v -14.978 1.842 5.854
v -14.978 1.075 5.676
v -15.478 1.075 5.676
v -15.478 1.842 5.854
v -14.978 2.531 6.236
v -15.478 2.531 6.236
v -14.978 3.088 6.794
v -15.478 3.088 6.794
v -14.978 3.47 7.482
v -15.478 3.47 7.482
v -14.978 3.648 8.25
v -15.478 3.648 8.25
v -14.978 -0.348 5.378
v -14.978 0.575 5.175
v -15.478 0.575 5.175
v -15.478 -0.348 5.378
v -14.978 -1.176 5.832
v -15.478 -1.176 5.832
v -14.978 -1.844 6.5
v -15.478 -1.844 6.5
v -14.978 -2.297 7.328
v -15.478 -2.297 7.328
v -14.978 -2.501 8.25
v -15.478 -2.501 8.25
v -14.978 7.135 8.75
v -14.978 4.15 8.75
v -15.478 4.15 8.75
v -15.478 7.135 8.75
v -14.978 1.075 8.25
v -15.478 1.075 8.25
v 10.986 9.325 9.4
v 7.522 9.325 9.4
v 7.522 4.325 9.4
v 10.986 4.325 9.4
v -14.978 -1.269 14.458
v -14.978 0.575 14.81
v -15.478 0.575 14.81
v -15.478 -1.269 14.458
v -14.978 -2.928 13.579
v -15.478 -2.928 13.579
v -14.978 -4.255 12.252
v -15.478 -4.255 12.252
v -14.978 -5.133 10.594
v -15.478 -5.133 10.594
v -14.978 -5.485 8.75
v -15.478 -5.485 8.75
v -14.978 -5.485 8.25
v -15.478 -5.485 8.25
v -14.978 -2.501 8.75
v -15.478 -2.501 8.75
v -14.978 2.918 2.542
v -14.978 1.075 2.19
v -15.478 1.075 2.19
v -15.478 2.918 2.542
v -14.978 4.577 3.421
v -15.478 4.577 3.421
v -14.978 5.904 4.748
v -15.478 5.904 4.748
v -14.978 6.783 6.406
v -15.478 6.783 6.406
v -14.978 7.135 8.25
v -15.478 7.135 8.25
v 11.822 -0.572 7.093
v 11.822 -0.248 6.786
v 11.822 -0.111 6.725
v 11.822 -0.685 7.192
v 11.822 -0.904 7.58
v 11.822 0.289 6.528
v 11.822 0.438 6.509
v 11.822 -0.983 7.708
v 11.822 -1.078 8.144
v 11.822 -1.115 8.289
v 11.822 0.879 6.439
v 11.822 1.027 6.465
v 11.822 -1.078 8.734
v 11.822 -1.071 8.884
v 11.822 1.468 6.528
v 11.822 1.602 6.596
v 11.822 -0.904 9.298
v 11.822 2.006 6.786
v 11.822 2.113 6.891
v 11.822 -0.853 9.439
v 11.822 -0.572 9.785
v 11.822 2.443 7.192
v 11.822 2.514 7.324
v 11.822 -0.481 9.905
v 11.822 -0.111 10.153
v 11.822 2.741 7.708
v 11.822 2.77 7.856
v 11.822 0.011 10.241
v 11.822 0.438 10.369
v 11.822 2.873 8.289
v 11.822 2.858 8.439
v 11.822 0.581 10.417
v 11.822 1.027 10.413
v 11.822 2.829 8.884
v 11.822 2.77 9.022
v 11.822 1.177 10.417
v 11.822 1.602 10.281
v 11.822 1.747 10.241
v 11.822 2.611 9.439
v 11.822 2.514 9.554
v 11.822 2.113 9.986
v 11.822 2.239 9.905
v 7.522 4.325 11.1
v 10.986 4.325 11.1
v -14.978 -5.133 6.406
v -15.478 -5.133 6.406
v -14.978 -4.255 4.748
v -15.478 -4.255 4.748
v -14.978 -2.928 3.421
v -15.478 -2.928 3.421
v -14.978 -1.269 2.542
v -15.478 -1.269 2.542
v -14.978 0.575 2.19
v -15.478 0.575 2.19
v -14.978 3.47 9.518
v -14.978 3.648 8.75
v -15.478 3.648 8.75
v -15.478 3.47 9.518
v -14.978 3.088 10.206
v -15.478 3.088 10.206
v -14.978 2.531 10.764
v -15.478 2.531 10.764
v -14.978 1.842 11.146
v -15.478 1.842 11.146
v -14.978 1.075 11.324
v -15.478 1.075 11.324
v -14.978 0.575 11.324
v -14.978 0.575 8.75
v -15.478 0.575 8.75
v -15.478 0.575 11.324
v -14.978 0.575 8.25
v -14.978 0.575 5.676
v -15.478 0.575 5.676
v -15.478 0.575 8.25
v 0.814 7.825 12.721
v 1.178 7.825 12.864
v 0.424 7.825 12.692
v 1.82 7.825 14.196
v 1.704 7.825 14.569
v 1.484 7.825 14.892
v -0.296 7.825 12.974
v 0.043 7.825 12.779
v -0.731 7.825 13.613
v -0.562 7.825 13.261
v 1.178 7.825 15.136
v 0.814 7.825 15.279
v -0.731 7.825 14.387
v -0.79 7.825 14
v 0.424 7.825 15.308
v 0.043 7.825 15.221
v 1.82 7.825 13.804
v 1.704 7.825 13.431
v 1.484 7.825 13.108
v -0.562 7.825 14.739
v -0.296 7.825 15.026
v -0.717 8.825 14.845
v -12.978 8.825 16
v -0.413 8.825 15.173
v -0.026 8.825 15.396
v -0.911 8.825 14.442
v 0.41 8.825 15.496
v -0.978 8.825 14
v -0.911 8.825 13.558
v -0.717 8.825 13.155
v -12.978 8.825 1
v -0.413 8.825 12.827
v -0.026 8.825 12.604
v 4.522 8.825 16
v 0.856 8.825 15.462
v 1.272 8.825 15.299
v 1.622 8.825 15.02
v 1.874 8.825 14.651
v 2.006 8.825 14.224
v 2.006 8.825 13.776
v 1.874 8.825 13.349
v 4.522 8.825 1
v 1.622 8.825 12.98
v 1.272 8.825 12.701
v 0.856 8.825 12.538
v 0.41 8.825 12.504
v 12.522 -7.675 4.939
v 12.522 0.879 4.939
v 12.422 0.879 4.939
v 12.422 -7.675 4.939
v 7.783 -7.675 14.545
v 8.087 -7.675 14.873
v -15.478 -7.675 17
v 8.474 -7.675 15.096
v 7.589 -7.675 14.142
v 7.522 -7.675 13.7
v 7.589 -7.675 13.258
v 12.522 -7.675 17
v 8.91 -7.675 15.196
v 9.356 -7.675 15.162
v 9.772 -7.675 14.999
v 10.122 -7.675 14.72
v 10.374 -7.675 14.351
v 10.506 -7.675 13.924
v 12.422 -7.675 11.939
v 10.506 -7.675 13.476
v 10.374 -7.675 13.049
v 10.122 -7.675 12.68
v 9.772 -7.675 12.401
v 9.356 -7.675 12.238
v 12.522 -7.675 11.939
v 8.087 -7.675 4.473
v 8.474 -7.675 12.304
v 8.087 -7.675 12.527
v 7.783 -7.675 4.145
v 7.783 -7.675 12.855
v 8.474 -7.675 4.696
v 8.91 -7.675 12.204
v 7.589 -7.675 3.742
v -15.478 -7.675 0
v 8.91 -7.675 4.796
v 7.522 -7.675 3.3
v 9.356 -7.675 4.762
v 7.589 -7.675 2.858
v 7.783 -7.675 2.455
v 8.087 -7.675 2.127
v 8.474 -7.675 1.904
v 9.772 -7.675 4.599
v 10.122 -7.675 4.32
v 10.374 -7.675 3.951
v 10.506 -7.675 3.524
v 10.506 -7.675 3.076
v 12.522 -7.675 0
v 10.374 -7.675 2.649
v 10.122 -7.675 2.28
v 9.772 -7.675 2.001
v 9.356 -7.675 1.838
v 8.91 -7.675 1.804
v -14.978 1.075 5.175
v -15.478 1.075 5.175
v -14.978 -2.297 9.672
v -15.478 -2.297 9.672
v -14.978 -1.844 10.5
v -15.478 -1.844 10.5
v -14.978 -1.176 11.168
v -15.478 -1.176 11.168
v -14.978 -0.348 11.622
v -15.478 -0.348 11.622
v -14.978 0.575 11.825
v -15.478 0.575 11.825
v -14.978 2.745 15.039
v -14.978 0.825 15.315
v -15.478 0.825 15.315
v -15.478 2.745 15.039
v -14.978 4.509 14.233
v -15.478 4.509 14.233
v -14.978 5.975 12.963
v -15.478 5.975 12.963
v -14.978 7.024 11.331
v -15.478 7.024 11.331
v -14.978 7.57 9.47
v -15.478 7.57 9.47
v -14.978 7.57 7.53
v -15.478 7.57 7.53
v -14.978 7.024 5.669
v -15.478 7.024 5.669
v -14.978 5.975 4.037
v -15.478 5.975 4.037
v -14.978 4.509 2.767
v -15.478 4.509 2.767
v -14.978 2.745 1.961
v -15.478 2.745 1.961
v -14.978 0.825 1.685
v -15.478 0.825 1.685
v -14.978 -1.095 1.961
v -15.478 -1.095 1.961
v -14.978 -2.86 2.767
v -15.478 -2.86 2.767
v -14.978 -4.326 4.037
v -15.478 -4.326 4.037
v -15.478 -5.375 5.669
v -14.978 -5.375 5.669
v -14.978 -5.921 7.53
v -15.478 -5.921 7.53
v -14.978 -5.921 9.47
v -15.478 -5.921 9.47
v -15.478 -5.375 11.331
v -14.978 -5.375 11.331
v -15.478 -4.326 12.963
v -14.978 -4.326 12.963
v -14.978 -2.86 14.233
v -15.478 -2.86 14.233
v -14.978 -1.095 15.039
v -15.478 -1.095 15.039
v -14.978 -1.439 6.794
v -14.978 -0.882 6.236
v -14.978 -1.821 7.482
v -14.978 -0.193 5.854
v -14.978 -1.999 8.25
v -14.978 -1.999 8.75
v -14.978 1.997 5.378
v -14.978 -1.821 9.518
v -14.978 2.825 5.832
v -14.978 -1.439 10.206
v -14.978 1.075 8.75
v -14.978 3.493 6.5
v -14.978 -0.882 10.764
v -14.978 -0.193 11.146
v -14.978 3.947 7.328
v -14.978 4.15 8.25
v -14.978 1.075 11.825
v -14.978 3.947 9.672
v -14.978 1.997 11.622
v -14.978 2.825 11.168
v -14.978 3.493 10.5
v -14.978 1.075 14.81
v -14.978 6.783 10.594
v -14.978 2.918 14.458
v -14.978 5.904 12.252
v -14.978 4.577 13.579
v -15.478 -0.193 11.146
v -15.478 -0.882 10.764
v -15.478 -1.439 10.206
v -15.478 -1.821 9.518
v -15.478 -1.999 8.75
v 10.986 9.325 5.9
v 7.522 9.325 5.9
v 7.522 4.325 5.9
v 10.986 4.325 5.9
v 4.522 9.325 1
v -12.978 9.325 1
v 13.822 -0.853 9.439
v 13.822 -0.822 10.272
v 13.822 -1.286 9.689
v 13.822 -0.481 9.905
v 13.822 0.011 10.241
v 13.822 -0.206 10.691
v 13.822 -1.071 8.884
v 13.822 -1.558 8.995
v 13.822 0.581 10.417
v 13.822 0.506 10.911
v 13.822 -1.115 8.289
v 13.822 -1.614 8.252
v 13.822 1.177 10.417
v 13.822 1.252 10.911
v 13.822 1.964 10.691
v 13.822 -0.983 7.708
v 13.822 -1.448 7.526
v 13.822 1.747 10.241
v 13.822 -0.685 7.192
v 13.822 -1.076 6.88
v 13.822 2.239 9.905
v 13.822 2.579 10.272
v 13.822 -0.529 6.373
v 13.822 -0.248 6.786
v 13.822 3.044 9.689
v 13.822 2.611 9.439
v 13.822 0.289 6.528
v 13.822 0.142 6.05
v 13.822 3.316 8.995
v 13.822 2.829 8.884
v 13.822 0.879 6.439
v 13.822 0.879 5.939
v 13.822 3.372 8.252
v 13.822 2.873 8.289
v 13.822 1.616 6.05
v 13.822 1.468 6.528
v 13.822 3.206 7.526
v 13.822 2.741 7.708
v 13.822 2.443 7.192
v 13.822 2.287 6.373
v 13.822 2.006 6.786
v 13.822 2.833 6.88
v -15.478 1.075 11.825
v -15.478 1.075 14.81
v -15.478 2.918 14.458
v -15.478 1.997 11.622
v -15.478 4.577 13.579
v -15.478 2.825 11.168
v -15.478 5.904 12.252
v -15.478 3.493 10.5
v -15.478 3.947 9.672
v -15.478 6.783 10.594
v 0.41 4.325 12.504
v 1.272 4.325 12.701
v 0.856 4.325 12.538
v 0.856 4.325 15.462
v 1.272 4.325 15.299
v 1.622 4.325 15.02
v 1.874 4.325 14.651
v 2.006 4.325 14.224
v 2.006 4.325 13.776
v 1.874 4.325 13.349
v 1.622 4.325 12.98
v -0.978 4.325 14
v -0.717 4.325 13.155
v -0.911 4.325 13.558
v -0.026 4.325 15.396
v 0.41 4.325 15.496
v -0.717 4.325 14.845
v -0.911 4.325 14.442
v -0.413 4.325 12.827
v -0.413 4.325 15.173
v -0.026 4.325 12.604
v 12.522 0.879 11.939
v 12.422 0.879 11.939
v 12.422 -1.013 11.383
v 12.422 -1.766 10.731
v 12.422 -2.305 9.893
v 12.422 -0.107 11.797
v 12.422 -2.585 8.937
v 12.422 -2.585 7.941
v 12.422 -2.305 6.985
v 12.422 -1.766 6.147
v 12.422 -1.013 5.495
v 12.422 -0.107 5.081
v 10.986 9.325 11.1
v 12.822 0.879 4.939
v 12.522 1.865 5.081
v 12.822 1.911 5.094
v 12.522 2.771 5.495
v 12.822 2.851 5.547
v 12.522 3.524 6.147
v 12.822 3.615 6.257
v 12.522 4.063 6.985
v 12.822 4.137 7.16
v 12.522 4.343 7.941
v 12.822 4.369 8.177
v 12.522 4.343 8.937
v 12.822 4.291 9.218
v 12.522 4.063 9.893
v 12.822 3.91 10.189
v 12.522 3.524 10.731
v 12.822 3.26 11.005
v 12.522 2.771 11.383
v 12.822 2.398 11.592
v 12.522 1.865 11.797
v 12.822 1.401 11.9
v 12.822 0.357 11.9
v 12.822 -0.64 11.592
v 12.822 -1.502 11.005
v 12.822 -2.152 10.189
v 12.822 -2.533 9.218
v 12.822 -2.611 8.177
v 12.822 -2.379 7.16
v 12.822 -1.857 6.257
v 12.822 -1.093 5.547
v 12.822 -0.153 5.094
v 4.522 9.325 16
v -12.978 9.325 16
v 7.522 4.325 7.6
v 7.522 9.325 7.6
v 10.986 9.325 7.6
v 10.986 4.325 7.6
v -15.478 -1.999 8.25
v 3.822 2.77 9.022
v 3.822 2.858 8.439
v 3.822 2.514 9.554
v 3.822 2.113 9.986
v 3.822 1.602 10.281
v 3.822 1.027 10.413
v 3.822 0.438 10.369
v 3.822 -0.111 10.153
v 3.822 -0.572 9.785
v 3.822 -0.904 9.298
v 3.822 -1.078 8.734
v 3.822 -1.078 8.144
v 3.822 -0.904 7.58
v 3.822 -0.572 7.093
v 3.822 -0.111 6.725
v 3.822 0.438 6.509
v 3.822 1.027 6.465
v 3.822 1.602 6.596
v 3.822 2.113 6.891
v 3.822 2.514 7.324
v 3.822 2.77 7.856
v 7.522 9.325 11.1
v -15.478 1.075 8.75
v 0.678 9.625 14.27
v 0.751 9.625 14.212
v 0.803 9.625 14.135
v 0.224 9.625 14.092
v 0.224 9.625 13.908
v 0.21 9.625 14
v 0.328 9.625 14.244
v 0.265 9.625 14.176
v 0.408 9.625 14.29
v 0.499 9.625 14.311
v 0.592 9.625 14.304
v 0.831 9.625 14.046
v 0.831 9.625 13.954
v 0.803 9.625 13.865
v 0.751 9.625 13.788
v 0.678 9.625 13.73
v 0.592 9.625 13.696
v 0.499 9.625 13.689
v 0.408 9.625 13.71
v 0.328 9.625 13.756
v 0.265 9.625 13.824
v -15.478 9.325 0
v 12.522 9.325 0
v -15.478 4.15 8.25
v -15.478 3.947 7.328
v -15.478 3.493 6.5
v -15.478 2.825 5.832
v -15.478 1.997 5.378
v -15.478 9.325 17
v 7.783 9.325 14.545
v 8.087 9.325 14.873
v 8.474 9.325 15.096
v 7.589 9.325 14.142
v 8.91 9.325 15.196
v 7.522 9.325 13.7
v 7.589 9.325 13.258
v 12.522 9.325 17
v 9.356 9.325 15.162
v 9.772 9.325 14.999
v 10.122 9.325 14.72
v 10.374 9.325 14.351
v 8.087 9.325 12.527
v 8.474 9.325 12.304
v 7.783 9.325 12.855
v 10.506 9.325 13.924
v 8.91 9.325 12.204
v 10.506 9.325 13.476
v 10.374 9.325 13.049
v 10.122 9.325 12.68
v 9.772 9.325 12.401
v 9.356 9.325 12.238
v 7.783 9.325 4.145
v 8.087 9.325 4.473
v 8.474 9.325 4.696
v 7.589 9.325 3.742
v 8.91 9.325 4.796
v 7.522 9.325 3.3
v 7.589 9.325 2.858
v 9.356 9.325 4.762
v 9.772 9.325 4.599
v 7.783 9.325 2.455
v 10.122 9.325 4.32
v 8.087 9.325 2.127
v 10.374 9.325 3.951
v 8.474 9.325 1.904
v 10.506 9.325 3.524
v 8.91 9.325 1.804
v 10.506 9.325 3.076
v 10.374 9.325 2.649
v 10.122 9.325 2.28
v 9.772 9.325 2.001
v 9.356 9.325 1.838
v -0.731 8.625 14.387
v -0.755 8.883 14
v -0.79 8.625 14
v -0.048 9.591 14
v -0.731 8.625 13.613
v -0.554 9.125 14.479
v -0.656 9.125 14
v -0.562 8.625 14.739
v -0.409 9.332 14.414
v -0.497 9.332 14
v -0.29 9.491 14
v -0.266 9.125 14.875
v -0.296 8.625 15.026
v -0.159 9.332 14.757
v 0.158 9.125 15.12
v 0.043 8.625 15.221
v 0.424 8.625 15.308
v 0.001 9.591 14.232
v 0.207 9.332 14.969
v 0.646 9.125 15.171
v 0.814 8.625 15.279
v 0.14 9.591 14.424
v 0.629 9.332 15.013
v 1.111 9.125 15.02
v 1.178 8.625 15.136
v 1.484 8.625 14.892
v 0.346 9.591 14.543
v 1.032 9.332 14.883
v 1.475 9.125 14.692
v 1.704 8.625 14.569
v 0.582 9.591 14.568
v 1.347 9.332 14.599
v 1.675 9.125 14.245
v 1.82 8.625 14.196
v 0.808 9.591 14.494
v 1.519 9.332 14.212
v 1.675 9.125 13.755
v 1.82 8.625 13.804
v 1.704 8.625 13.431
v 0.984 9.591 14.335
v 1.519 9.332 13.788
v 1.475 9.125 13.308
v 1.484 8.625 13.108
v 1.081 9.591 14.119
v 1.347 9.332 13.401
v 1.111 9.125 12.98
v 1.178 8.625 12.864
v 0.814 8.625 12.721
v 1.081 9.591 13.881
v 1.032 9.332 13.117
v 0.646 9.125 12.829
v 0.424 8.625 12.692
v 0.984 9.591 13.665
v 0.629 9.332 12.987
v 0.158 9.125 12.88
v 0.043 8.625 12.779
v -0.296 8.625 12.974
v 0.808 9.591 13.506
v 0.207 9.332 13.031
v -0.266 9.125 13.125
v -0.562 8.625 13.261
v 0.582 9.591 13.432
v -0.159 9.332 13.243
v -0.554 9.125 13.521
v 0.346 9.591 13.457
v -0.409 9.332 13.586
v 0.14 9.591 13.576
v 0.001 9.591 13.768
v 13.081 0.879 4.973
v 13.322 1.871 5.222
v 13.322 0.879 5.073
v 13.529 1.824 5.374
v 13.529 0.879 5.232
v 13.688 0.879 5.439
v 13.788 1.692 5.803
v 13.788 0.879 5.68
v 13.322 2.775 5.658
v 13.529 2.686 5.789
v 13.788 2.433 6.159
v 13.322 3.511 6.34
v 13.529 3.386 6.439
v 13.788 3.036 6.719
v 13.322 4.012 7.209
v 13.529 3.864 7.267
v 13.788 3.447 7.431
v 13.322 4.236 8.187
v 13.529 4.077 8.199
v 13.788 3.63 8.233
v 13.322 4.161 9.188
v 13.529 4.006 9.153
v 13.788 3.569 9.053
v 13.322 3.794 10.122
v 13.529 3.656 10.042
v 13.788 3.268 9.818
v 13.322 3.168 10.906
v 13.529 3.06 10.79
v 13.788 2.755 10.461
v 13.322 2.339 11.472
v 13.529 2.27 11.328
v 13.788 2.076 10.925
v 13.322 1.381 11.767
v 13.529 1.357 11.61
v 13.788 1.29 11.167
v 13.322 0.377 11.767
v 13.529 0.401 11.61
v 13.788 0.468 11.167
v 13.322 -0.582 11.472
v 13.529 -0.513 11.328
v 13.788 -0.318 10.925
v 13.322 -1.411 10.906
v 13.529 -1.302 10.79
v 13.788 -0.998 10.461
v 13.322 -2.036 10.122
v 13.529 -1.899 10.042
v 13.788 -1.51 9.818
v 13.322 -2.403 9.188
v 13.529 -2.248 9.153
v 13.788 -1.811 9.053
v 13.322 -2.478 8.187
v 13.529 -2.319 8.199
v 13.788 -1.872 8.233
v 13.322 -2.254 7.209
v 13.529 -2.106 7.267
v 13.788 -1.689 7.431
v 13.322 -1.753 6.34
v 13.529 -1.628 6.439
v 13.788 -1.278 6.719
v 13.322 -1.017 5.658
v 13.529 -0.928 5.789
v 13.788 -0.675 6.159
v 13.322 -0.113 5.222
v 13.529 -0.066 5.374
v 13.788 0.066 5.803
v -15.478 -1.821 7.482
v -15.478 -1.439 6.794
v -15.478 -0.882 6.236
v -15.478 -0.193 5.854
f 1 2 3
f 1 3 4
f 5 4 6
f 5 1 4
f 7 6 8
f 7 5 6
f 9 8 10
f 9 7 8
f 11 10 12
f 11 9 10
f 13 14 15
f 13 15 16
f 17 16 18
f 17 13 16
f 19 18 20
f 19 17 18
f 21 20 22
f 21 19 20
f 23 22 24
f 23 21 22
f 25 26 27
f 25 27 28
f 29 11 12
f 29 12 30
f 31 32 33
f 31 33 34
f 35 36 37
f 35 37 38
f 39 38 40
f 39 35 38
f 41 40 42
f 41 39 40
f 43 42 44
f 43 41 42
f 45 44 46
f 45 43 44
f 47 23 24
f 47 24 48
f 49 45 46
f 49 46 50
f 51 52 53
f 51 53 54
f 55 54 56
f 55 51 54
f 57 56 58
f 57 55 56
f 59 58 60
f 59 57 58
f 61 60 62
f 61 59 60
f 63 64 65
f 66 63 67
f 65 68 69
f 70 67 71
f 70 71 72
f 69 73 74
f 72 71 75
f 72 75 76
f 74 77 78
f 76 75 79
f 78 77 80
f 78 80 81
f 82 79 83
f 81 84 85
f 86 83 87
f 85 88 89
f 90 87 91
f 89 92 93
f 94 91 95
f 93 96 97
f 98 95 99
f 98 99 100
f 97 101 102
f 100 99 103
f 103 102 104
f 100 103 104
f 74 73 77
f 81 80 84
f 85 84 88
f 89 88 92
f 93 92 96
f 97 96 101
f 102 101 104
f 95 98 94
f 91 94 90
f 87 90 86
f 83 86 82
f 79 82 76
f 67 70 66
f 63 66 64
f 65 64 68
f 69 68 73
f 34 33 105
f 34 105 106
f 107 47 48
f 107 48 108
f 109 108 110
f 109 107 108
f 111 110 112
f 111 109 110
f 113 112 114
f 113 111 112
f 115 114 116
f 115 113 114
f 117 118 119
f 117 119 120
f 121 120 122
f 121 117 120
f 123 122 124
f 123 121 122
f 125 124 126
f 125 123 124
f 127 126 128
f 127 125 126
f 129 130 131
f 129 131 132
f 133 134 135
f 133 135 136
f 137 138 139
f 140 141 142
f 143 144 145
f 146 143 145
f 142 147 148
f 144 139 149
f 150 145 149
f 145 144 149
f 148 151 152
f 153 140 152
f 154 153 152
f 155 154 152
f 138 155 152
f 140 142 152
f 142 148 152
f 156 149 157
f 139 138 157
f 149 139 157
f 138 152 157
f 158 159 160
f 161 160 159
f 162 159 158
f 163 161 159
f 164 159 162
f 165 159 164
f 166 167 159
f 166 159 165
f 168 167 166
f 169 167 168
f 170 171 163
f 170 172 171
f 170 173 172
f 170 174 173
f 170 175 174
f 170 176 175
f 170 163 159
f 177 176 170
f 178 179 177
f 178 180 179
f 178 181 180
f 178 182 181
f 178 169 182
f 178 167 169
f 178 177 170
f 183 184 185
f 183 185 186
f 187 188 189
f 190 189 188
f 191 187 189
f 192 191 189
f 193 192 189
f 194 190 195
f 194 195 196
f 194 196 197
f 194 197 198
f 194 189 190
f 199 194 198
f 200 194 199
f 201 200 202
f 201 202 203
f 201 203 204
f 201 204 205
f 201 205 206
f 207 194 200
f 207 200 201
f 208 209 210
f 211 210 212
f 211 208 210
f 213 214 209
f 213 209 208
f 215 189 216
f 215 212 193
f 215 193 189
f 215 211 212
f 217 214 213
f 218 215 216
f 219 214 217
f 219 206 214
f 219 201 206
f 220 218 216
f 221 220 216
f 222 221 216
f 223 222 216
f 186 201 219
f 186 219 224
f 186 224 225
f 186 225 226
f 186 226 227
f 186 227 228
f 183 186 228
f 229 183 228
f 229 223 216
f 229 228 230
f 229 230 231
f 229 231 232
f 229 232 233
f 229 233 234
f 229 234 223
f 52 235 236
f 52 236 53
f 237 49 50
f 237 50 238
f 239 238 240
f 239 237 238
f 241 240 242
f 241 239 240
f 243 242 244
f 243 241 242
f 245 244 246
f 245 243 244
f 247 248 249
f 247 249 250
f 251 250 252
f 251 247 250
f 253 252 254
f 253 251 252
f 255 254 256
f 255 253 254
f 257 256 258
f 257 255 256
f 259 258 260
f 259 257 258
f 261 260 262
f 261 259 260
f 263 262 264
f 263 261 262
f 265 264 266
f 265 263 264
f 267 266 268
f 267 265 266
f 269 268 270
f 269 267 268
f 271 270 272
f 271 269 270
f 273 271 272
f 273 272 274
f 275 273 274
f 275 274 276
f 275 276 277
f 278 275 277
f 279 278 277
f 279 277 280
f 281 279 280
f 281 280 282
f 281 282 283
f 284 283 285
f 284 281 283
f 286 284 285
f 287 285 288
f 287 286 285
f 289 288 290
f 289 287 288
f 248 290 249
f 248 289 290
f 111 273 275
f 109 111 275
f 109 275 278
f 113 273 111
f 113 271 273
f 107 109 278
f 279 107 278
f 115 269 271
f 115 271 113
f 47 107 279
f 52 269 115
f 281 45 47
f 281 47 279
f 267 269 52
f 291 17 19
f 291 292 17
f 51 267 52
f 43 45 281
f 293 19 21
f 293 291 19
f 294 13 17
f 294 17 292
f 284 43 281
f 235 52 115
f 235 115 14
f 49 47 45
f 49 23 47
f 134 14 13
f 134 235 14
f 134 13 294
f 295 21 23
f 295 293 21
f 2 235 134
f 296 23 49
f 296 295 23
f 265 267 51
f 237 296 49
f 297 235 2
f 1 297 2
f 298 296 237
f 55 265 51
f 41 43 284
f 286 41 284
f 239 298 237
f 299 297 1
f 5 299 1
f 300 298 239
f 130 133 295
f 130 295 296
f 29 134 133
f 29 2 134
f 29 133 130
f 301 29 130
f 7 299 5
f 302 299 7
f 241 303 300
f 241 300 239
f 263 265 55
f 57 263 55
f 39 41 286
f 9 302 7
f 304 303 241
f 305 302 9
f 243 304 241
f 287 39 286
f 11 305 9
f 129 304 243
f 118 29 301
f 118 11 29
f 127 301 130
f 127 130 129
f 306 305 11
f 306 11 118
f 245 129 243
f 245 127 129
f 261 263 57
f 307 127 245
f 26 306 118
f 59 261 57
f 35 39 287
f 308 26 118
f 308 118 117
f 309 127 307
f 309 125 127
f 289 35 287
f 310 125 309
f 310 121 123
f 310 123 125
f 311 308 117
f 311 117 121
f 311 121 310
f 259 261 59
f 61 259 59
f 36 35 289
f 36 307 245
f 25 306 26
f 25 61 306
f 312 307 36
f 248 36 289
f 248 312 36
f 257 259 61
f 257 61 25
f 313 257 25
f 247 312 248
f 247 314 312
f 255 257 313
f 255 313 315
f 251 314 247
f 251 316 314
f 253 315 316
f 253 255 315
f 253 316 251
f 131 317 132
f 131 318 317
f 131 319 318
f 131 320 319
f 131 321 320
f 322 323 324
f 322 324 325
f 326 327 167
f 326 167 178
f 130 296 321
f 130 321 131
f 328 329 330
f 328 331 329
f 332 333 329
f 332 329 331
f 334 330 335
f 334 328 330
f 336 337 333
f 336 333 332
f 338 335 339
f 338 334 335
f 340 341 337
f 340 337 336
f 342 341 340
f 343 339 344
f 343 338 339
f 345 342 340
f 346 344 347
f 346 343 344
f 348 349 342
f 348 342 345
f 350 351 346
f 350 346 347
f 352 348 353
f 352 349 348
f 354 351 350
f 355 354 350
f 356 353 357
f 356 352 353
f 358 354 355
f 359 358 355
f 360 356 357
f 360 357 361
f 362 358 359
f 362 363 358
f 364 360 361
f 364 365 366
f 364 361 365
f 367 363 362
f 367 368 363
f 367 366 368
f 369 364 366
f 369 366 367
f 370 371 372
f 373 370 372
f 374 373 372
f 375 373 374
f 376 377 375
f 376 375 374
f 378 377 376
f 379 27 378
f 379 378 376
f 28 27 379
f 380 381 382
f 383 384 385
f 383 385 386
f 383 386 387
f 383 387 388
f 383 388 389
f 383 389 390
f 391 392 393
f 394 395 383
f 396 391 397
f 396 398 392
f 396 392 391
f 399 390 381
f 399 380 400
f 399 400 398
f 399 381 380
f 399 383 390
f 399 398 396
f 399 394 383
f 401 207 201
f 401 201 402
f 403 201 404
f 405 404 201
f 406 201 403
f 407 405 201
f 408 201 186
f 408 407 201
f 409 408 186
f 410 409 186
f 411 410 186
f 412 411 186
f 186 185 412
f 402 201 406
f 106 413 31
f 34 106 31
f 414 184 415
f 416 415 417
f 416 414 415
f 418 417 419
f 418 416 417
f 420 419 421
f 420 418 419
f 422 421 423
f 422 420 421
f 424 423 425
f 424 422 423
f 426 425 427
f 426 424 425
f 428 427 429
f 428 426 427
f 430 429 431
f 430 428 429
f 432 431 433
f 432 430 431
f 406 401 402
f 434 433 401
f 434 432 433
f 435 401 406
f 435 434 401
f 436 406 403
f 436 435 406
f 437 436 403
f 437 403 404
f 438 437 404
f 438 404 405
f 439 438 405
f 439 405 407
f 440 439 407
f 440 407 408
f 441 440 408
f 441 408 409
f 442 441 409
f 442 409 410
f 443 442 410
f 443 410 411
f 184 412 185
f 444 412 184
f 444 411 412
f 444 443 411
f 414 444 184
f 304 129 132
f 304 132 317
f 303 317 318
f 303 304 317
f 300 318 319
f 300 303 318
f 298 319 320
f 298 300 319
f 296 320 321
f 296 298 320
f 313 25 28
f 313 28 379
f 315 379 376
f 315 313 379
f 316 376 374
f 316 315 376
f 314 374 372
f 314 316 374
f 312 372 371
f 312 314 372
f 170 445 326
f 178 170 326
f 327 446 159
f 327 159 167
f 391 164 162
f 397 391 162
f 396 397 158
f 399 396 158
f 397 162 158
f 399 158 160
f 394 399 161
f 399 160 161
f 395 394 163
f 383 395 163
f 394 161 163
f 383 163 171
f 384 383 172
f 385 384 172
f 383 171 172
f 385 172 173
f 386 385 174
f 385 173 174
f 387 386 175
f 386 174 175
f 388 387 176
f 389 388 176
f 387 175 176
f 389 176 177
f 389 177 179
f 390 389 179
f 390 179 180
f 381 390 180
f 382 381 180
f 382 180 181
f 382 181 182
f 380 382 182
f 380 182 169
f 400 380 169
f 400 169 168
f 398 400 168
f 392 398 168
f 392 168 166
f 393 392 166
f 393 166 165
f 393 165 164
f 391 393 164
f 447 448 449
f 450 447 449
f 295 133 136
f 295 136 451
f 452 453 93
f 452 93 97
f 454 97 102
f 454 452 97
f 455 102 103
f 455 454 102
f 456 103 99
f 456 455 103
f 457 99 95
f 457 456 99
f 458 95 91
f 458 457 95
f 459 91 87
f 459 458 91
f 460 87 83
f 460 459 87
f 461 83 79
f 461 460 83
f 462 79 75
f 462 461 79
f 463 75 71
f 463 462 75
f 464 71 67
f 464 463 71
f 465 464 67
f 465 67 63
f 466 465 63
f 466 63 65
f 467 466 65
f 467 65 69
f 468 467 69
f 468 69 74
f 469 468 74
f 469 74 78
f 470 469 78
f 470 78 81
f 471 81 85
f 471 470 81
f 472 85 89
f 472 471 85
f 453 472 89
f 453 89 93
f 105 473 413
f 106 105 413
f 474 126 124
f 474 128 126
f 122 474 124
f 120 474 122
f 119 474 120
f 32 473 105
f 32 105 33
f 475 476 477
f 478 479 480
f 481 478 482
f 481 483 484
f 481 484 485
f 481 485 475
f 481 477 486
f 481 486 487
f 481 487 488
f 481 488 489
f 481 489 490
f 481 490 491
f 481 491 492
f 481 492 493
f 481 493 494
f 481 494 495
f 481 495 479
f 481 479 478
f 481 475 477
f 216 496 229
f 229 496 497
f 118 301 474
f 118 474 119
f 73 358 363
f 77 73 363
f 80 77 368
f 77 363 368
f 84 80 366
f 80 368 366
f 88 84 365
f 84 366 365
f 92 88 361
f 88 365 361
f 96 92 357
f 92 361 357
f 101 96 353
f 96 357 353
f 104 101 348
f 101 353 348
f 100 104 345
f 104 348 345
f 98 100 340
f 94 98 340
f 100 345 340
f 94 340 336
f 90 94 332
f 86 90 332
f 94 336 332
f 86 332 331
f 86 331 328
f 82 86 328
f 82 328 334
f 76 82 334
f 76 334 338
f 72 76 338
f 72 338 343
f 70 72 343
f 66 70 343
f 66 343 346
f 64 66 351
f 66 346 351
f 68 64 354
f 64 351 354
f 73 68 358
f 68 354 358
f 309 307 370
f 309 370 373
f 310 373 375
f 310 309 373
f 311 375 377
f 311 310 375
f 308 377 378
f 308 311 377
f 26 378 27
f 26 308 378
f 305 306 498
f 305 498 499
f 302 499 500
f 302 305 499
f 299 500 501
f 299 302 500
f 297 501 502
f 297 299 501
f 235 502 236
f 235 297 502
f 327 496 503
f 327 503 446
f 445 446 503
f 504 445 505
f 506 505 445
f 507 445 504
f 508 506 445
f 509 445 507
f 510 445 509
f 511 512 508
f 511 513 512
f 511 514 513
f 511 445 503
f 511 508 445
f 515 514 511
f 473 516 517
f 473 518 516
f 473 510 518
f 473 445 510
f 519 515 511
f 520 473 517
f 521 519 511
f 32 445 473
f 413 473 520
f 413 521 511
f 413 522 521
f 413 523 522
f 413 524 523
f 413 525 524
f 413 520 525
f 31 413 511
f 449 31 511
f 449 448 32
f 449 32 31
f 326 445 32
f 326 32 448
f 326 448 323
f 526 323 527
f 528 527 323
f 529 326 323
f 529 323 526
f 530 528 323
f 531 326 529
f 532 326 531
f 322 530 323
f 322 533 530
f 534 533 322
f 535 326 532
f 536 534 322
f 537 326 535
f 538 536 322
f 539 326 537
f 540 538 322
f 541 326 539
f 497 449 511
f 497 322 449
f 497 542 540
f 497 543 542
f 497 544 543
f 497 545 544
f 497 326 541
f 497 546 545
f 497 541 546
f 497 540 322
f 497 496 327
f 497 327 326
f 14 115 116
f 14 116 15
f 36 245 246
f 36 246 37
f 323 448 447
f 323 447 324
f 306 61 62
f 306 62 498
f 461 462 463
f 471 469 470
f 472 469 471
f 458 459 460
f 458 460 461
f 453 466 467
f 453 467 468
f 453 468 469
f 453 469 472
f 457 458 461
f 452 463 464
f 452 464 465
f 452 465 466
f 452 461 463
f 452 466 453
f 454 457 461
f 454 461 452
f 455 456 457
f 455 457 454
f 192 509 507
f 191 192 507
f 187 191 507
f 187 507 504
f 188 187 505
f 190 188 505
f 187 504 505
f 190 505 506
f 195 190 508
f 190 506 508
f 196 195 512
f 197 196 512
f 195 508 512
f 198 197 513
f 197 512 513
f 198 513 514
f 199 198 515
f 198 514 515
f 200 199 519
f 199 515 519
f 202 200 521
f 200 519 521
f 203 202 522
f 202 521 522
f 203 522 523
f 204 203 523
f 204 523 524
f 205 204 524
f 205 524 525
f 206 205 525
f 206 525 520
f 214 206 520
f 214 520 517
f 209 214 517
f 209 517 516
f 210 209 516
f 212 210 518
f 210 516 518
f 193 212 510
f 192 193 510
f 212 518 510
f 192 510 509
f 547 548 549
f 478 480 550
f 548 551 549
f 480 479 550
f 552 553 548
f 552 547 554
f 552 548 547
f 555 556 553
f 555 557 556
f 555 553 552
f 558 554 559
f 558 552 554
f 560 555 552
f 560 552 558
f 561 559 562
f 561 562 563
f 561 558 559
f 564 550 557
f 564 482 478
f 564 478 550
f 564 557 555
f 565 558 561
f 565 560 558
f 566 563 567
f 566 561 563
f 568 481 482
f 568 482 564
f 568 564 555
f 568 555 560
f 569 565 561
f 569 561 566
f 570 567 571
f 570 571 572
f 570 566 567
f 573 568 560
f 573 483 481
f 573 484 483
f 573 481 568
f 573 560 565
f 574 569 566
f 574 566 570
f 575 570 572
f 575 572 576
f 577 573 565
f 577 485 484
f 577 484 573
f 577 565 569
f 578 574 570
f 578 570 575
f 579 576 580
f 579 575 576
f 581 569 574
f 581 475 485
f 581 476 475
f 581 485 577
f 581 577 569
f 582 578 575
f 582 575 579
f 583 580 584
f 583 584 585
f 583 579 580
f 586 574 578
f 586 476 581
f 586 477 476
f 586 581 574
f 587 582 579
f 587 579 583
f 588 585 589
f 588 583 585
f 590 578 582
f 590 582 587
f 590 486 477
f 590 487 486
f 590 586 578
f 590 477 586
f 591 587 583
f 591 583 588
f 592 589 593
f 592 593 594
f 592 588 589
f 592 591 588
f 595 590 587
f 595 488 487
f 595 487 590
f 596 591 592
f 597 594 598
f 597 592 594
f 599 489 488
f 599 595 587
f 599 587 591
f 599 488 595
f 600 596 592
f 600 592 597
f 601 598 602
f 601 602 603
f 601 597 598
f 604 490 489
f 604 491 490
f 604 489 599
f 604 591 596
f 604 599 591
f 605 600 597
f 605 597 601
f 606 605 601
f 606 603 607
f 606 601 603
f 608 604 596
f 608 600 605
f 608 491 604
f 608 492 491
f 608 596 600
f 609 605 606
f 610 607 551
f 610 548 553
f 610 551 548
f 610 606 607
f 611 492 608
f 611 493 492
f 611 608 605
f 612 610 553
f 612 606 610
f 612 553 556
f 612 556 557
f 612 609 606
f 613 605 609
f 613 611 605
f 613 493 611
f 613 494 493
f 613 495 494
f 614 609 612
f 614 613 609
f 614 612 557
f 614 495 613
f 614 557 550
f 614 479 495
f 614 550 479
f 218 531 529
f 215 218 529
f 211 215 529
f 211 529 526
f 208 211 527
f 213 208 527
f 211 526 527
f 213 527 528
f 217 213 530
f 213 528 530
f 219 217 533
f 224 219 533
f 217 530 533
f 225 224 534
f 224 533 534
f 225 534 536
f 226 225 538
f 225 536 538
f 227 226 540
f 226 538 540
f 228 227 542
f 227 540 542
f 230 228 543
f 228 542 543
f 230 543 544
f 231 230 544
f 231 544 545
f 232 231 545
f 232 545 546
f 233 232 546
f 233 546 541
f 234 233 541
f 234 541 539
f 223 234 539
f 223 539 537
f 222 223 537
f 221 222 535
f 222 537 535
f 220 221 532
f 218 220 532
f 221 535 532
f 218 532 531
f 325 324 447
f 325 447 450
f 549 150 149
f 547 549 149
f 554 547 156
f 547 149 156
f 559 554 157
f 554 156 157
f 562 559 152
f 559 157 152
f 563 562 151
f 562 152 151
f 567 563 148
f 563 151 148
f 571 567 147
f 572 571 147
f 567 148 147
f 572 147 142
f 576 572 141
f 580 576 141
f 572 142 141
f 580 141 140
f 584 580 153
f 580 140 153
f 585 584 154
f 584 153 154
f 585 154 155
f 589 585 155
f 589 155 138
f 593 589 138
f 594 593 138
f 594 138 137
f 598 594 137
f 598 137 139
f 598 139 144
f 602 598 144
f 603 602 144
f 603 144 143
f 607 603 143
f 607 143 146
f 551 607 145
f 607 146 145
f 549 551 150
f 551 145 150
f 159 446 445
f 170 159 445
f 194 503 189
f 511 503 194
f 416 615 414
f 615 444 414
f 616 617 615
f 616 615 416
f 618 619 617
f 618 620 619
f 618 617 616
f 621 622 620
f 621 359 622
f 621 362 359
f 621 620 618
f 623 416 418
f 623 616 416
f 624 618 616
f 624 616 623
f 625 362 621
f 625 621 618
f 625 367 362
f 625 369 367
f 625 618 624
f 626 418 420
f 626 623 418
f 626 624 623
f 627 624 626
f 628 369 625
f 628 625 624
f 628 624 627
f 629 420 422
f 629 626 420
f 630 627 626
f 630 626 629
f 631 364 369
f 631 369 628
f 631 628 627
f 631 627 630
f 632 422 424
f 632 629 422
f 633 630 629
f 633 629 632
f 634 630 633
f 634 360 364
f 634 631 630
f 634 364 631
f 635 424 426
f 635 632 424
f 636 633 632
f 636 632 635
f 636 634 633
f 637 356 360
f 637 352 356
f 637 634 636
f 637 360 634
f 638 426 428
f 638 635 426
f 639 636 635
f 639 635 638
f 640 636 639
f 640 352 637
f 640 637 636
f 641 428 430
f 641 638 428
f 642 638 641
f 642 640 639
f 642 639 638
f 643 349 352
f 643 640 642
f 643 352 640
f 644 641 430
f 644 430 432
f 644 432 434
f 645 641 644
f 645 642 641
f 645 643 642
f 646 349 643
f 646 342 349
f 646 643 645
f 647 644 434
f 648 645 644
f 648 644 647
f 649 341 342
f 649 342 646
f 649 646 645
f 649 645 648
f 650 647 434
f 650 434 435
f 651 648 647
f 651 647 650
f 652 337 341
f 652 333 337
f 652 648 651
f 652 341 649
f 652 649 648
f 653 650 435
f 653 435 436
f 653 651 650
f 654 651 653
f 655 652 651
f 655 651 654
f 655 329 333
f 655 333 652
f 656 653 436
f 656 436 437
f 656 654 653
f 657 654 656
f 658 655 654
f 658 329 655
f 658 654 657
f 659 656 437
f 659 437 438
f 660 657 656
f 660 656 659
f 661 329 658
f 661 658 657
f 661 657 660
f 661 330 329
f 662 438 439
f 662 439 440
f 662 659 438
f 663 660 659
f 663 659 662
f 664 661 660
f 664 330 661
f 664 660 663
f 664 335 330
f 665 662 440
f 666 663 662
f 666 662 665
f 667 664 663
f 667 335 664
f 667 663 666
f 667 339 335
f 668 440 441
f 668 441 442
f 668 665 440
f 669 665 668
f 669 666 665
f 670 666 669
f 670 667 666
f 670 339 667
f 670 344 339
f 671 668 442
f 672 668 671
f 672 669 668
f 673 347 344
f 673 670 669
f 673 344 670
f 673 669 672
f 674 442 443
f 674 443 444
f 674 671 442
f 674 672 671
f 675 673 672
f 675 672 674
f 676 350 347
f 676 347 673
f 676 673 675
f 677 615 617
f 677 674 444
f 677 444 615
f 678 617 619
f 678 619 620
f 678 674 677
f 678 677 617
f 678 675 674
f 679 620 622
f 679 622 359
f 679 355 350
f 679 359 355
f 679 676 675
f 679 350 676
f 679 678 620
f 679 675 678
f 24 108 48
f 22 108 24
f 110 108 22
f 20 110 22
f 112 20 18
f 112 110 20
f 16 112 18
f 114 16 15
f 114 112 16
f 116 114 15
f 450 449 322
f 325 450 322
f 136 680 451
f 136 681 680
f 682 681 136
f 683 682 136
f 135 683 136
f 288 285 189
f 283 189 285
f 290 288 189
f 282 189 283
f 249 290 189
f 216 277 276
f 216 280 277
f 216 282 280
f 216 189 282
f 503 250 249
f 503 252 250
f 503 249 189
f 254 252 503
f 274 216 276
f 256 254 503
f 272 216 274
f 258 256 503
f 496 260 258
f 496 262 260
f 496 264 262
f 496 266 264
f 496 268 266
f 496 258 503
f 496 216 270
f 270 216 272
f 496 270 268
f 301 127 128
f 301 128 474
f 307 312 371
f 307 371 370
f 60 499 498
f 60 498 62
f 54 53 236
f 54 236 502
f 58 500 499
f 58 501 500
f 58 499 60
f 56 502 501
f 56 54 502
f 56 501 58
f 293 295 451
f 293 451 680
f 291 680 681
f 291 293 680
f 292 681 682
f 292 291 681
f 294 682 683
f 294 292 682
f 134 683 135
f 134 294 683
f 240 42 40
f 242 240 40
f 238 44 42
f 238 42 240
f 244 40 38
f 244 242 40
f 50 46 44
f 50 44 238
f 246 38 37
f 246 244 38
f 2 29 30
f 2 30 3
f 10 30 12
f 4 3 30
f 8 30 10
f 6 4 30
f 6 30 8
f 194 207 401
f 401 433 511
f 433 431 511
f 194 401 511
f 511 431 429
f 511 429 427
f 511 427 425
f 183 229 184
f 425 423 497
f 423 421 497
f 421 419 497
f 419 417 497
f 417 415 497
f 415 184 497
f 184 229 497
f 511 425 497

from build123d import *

# Parameters (mm, degrees)
SKETCH_1_W              = 28
SKETCH_1_H              = 17
EXTRUDE_1_DEPTH         = 17
SKETCH_2_R              = 1.5
CUT_EXTRUDE_2_DEPTH     = 17
SKETCH_3_R              = 1.5
CUT_EXTRUDE_3_DEPTH     = 5
SKETCH_4_W              = 17.5
SKETCH_4_H              = 15
CUT_EXTRUDE_4_DEPTH     = 0.5
CUT_EXTRUDE_START       = -0.5
CUT_EXTRUDE_1_OUTLINE_R = 6.815064579
CUT_EXTRUDE_1_DEPTH     = 0.5
CUT_EXTRUDE_5_DEPTH     = 0.7
EXTRUDE_START           = 2
SKETCH_7_R              = 3.5
SKETCH_7_R_2            = 2
EXTRUDE_2_DEPTH         = 2
FILLET_1_R              = 1
EXTRUDE_START_2         = 0.6
EXTRUDE_17_DEPTH        = 0.6
EXTRUDE_18_DEPTH        = 0.8
EXTRUDE_18_DEPTH_BACK   = 1
SKETCH_9_R              = 1.311922651
FILLET_2_R              = 1
SKETCH_10_W             = 3.463451164
SKETCH_10_H             = 1.7
CUT_EXTRUDE_6_DEPTH     = 5
CUT_EXTRUDE_START_2     = 3.82238806
CUT_EXTRUDE_7_OUTLINE_R = 1.979264392
CUT_EXTRUDE_7_DEPTH     = 8


# Read off the part's stored shape, not the designer's step: Вырез-Вытянуть-Тонкостенный1, Вырез-Вытянуть7
with BuildPart() as part:
    # Эскиз1 → Бобышка-Вытянуть1 (new body)
    with BuildSketch(Plane.XY):
        with Locations((-1.47761194, 0.824626866)):
            Rectangle(SKETCH_1_W, SKETCH_1_H)
    extrude(amount=EXTRUDE_1_DEPTH)

    # Эскиз2 → Вырез-Вытянуть2 (cut)
    with BuildSketch(Plane(origin=(0, 9.324626866, 0), x_dir=(1, 0, 0), z_dir=(0, 1, 0))):
        with Locations(Location((9.02238806, -3.3, 0), (0, 0, 180))):
            Circle(SKETCH_2_R)
        with Locations(Location((9.02238806, -13.7, 0), (0, 0, 180))):
            Circle(SKETCH_2_R)
    extrude(amount=-CUT_EXTRUDE_2_DEPTH, mode=Mode.SUBTRACT)

    # Эскиз3 → Вырез-Вытянуть3 (cut)
    with BuildSketch(Plane(origin=(0, 9.324626866, 0), x_dir=(1, 0, 0), z_dir=(0, 1, 0))):
        with Locations(Location((0.52238806, -14, 0), (0, 0, 180))):
            Circle(SKETCH_3_R)
    extrude(amount=-CUT_EXTRUDE_3_DEPTH, mode=Mode.SUBTRACT)

    # Эскиз4 → Вырез-Вытянуть4 (cut)
    with BuildSketch(Plane(origin=(0, 9.324626866, 0), x_dir=(1, 0, 0), z_dir=(0, 1, 0))):
        with Locations((-4.22761194, -8.5)):
            Rectangle(SKETCH_4_W, SKETCH_4_H)
    extrude(amount=-CUT_EXTRUDE_4_DEPTH, mode=Mode.SUBTRACT)

    # Вырез-Вытянуть-Тонкостенный1 outline → Вырез-Вытянуть-Тонкостенный1 (cut)
    with BuildSketch(Plane.ZY.offset(15.47761194).offset(CUT_EXTRUDE_START)):
        with Locations((8.5, 0.824626866)):
            Circle(CUT_EXTRUDE_1_OUTLINE_R)
        with BuildLine():
            Line((2.189885845, 0.574626866), (5.174644222, 0.574626866))
            ThreePointArc((5.174644222, 0.574626866), (6.141982713, -1.533390421), (8.25, -2.500728912))
            Line((8.25, -2.500728912), (8.25, -5.485487289))
            ThreePointArc((8.25, -5.485487289), (4.034575012, -3.640798122), (2.189885845, 0.574626866))
        make_face(mode=Mode.SUBTRACT)
        with BuildLine():
            ThreePointArc((8.25, -1.999067704), (6.495536104, -1.17983703), (5.67630543, 0.574626866))
            Line((5.67630543, 0.574626866), (8.25, 0.574626866))
            Line((8.25, 0.574626866), (8.25, -1.999067704))
        make_face(mode=Mode.SUBTRACT)
        with BuildLine():
            Line((8.75, -5.485487289), (8.75, -2.500728912))
            ThreePointArc((8.75, -2.500728912), (10.858017287, -1.533390421), (11.825355778, 0.574626866))
            Line((11.825355778, 0.574626866), (14.810114155, 0.574626866))
            ThreePointArc((14.810114155, 0.574626866), (12.965424988, -3.640798122), (8.75, -5.485487289))
        make_face(mode=Mode.SUBTRACT)
        with BuildLine():
            ThreePointArc((11.32369457, 0.574626866), (10.504463896, -1.17983703), (8.75, -1.999067704))
            Line((8.75, -1.999067704), (8.75, 0.574626866))
            Line((8.75, 0.574626866), (11.32369457, 0.574626866))
        make_face(mode=Mode.SUBTRACT)
        with BuildLine():
            ThreePointArc((5.67630543, 1.074626866), (6.495536104, 2.829090762), (8.25, 3.648321435))
            Line((8.25, 3.648321435), (8.25, 1.074626866))
            Line((8.25, 1.074626866), (5.67630543, 1.074626866))
        make_face(mode=Mode.SUBTRACT)
        with BuildLine():
            Line((8.25, 7.13474102), (8.25, 4.149982644))
            ThreePointArc((8.25, 4.149982644), (6.141982714, 3.182644152), (5.174644222, 1.074626866))
            Line((5.174644222, 1.074626866), (2.189885845, 1.074626866))
            ThreePointArc((2.189885845, 1.074626866), (4.034575012, 5.290051853), (8.25, 7.13474102))
        make_face(mode=Mode.SUBTRACT)
        with BuildLine():
            ThreePointArc((8.75, 3.648321435), (10.504463896, 2.829090762), (11.32369457, 1.074626866))
            Line((11.32369457, 1.074626866), (8.75, 1.074626866))
            Line((8.75, 1.074626866), (8.75, 3.648321435))
        make_face(mode=Mode.SUBTRACT)
        with BuildLine():
            Line((14.810114155, 1.074626866), (11.825355778, 1.074626866))
            ThreePointArc((11.825355778, 1.074626866), (10.858017286, 3.182644152), (8.75, 4.149982644))
            Line((8.75, 4.149982644), (8.75, 7.13474102))
            ThreePointArc((8.75, 7.13474102), (12.965424988, 5.290051853), (14.810114155, 1.074626866))
        make_face(mode=Mode.SUBTRACT)
    extrude(amount=CUT_EXTRUDE_1_DEPTH, mode=Mode.SUBTRACT)

    # Эскиз6 → Вырез-Вытянуть5 (cut)
    with BuildSketch(Plane(origin=(12.52238806, 0, 0), x_dir=(0, 0, -1), z_dir=(1, 0, 0))):
        with BuildLine():
            Line((-11.938898547, -7.675373134), (-11.938898547, 0.878920234))
            ThreePointArc((-11.938898547, 0.878920234), (-8.438898547, 4.378920234), (-4.938898547, 0.878920234))
            Line((-4.938898547, 0.878920234), (-4.938898547, -7.675373134))
            Line((-4.938898547, -7.675373134), (-11.938898547, -7.675373134))
        make_face()
    extrude(amount=-CUT_EXTRUDE_5_DEPTH, mode=Mode.SUBTRACT)

    # Эскиз7 → Бобышка-Вытянуть2 (add)
    with BuildSketch(Plane(origin=(11.82238806, 0, 0), x_dir=(0, 0, -1), z_dir=(1, 0, 0)).offset(EXTRUDE_START)):
        with Locations((-8.438898547, 0.878920234)):
            Circle(SKETCH_7_R)
        with Locations((-8.438898547, 0.878920234)):
            Circle(SKETCH_7_R_2, mode=Mode.SUBTRACT)
    extrude(amount=-EXTRUDE_2_DEPTH)

    # Скругление1
    fillet_1_edges = [part.edges().sort_by_distance(p)[0] for p in [
        (13.82238806, 0.878920234, 11.938898547),
    ]]
    fillet(fillet_1_edges, radius=FILLET_1_R)

    # Эскиз8 → Бобышка-Вытянуть17 (add)
    with BuildSketch(Plane(origin=(11.82238806, 0, 0), x_dir=(0, 0, -1), z_dir=(1, 0, 0)).offset(EXTRUDE_START_2)):
        with BuildLine():
            Line((-11.938898547, -7.675373134), (-4.938898547, -7.675373134))
            Line((-4.938898547, -7.675373134), (-4.938898547, 0.878920234))
            ThreePointArc((-4.938898547, 0.878920234), (-8.438898547, -2.621079766), (-11.938898547, 0.878920234))
            Line((-11.938898547, 0.878920234), (-11.938898547, -7.675373134))
        make_face()
    extrude(amount=-EXTRUDE_17_DEPTH)

    # Эскиз10 → Вырез-Вытянуть6 (cut)
    with BuildSketch(Plane(origin=(0, 9.324626866, 0), x_dir=(1, 0, 0), z_dir=(0, 1, 0))):
        with Locations((9.254113642, -10.25)):
            Rectangle(SKETCH_10_W, SKETCH_10_H)
        with Locations((9.254113642, -6.75)):
            Rectangle(SKETCH_10_W, SKETCH_10_H)
    extrude(amount=-CUT_EXTRUDE_6_DEPTH, mode=Mode.SUBTRACT)

    # Вырез-Вытянуть7 outline → Вырез-Вытянуть7 (cut)
    with BuildSketch(Plane.YZ.offset(CUT_EXTRUDE_START_2)):
        with Locations((0.878920234, 8.438898547)):
            Circle(CUT_EXTRUDE_7_OUTLINE_R)
    extrude(amount=CUT_EXTRUDE_7_DEPTH, mode=Mode.SUBTRACT)


with BuildPart() as body_2:
    # Эскиз9 → Бобышка-Вытянуть18 (new, two sides: drawn at the far end of the back side and taken through both)
    with BuildSketch(Plane(origin=(0, 8.824626866, 0), x_dir=(1, 0, 0), z_dir=(0, 1, 0)).offset(-EXTRUDE_18_DEPTH_BACK)):
        with Locations(Location((0.52238806, -14, 0), (0, 0, 180))):
            Circle(SKETCH_9_R)
    extrude(amount=EXTRUDE_18_DEPTH + EXTRUDE_18_DEPTH_BACK)

    # Скругление2
    fillet_2_edges = [body_2.edges().sort_by_distance(p)[0] for p in [
        (1.834310711, 9.624626866, 14),
    ]]
    fillet(fillet_2_edges, radius=FILLET_2_R)


solid = Compound([part.part, body_2.part])
